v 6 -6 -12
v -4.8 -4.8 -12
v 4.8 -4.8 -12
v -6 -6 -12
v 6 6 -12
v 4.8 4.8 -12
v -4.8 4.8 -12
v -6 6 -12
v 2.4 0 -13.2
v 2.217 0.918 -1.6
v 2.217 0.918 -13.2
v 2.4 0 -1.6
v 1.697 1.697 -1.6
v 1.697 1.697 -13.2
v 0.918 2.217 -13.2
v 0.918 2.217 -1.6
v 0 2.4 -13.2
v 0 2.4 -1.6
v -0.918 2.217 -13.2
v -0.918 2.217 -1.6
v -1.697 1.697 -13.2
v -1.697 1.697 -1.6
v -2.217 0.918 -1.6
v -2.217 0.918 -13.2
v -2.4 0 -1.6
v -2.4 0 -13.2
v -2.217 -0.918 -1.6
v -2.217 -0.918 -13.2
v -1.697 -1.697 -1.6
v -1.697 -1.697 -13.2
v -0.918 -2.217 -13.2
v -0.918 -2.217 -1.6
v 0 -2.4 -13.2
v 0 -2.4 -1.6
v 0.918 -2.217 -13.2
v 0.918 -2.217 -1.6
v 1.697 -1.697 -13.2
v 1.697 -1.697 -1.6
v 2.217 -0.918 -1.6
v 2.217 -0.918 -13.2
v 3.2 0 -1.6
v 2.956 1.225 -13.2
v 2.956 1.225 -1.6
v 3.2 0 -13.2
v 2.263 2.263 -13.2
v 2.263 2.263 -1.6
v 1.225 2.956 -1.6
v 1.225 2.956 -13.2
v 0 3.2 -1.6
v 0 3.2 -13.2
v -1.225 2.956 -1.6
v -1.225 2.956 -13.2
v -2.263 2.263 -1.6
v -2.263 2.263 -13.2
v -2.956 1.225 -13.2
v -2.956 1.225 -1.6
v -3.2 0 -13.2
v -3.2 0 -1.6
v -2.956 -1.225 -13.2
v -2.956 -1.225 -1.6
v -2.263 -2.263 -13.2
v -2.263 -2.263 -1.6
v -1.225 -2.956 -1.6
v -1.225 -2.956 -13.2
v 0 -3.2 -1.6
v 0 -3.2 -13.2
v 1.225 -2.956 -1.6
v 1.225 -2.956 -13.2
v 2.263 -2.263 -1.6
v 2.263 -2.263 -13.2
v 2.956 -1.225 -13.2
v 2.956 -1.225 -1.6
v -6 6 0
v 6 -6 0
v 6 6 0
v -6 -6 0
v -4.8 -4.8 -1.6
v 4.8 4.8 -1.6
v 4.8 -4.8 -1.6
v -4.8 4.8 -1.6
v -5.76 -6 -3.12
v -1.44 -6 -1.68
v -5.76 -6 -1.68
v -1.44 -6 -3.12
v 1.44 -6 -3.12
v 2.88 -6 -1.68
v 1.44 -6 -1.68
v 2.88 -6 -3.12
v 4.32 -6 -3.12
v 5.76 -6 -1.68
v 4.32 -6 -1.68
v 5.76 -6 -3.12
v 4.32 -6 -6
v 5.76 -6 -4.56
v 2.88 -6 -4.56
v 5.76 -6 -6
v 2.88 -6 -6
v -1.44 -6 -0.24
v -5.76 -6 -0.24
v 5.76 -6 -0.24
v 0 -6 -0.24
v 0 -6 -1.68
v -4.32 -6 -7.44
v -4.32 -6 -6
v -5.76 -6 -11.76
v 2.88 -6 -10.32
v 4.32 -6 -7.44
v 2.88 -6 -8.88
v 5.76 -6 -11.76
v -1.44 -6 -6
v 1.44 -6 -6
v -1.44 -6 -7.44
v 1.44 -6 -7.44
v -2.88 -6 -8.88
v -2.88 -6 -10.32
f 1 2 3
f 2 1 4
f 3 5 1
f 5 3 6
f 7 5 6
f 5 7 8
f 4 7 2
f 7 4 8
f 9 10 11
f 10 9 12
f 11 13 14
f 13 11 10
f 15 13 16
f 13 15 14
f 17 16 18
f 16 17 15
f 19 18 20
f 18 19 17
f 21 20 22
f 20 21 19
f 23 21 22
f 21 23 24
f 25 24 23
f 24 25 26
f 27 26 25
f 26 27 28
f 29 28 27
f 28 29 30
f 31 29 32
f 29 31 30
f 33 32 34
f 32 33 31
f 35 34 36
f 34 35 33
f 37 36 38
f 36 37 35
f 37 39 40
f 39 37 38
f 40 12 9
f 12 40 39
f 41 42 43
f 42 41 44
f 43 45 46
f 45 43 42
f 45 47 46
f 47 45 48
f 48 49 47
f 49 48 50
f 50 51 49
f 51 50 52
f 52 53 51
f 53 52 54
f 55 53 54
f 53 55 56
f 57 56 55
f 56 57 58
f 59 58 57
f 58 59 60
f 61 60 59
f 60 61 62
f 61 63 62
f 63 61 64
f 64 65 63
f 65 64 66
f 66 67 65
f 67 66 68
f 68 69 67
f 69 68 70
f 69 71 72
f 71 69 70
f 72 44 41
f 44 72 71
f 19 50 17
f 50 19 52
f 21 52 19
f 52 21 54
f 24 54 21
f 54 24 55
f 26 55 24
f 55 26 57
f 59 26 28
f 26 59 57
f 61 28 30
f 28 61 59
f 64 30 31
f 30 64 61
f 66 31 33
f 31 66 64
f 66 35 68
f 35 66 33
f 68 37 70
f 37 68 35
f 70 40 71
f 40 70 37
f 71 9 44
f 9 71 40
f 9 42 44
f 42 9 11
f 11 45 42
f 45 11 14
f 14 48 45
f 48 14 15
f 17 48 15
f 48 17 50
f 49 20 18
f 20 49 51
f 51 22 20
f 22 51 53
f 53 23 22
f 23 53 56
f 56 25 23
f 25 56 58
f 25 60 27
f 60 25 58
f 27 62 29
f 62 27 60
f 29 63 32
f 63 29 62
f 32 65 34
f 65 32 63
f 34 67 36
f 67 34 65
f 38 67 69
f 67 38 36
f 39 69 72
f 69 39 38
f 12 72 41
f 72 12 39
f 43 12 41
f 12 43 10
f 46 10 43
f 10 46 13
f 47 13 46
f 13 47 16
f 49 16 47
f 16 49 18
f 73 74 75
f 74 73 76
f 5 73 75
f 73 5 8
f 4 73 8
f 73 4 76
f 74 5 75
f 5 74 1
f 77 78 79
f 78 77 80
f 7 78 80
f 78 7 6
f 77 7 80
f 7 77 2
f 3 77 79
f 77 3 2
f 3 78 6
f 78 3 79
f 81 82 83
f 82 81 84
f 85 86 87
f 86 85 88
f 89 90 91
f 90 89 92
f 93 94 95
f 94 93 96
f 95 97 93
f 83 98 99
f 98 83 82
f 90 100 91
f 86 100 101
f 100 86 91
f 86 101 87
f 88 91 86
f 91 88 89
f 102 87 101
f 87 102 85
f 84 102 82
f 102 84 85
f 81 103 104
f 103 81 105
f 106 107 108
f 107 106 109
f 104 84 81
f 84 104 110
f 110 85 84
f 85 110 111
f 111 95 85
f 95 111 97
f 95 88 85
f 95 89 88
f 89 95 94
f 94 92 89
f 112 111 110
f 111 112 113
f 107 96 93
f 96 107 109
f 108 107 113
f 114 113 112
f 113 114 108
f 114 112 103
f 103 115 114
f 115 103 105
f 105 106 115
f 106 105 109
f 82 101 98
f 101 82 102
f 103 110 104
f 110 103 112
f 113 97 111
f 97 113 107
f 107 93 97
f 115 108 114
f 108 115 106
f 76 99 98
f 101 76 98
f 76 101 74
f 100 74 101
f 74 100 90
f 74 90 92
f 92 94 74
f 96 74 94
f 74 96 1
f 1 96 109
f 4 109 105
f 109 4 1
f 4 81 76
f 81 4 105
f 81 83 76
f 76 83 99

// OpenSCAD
// file: ../p/4-4ring3.scad
use <../lib.scad>
$fa=1; $fs=0.2;
function ldraw_lib__4_4ring3(realsolid=false) = [
// 0 Ring  3 x 1.0
// 0 Name: 4-4ring3.dat
// 0 Author: James Jessiman
// 0 !LDRAW_ORG Primitive UPDATE 2009-01
// 0 !LICENSE Licensed under CC BY 2.0 and CC BY 4.0 : see CAreadme.txt
// 
// 0 BFC CERTIFY CCW
  [0,"BFC","CERTIFY"],
  [0,"BFC","CCW"],
// 
// 0 !HISTORY 1998-12-15 [PTadmin] Official Update 1998-10
// 0 !HISTORY 2002-04-05 [hafhead] Added BFC statement
// 0 !HISTORY 2002-04-25 [PTadmin] Official Update 2002-02
// 0 !HISTORY 2007-06-24 [PTadmin] Header formatted for Contributor Agreement
// 0 !HISTORY 2008-07-01 [PTadmin] Official Update 2008-01
// 0 !HISTORY 2008-08-26 [cwdee] Switch polygon winding and rename
// 0 !HISTORY 2009-05-02 [PTadmin] Official Update 2009-01
// 
// 
// 4 16 -1.5308 0 3.6956 -1.1481 0 2.7717 0 0 3 0 0 4
  [4,16,-1.5308,0,3.6956,-1.1481,0,2.7717,0,0,3,0,0,4],
// 4 16 -2.8284 0 2.8284 -2.1213 0 2.1213 -1.1481 0 2.7717 -1.5308 0 3.6956
  [4,16,-2.8284,0,2.8284,-2.1213,0,2.1213,-1.1481,0,2.7717,-1.5308,0,3.6956],
// 4 16 -3.6956 0 1.5308 -2.7717 0 1.1481 -2.1213 0 2.1213 -2.8284 0 2.8284
  [4,16,-3.6956,0,1.5308,-2.7717,0,1.1481,-2.1213,0,2.1213,-2.8284,0,2.8284],
// 4 16 -4 0 0 -3 0 0 -2.7717 0 1.1481 -3.6956 0 1.5308
  [4,16,-4,0,0,-3,0,0,-2.7717,0,1.1481,-3.6956,0,1.5308],
// 4 16 -3.6956 0 -1.5308 -2.7717 0 -1.1481 -3 0 0 -4 0 0
  [4,16,-3.6956,0,-1.5308,-2.7717,0,-1.1481,-3,0,0,-4,0,0],
// 4 16 -2.8284 0 -2.8284 -2.1213 0 -2.1213 -2.7717 0 -1.1481 -3.6956 0 -1.5308
  [4,16,-2.8284,0,-2.8284,-2.1213,0,-2.1213,-2.7717,0,-1.1481,-3.6956,0,-1.5308],
// 4 16 -1.5308 0 -3.6956 -1.1481 0 -2.7717 -2.1213 0 -2.1213 -2.8284 0 -2.8284
  [4,16,-1.5308,0,-3.6956,-1.1481,0,-2.7717,-2.1213,0,-2.1213,-2.8284,0,-2.8284],
// 4 16 0 0 -4 0 0 -3 -1.1481 0 -2.7717 -1.5308 0 -3.6956
  [4,16,0,0,-4,0,0,-3,-1.1481,0,-2.7717,-1.5308,0,-3.6956],
// 4 16 1.5308 0 -3.6956 1.1481 0 -2.7717 0 0 -3 0 0 -4
  [4,16,1.5308,0,-3.6956,1.1481,0,-2.7717,0,0,-3,0,0,-4],
// 4 16 2.8284 0 -2.8284 2.1213 0 -2.1213 1.1481 0 -2.7717 1.5308 0 -3.6956
  [4,16,2.8284,0,-2.8284,2.1213,0,-2.1213,1.1481,0,-2.7717,1.5308,0,-3.6956],
// 4 16 3.6956 0 -1.5308 2.7717 0 -1.1481 2.1213 0 -2.1213 2.8284 0 -2.8284
  [4,16,3.6956,0,-1.5308,2.7717,0,-1.1481,2.1213,0,-2.1213,2.8284,0,-2.8284],
// 4 16 4 0 0 3 0 0 2.7717 0 -1.1481 3.6956 0 -1.5308
  [4,16,4,0,0,3,0,0,2.7717,0,-1.1481,3.6956,0,-1.5308],
// 4 16 3.6956 0 1.5308 2.7717 0 1.1481 3 0 0 4 0 0
  [4,16,3.6956,0,1.5308,2.7717,0,1.1481,3,0,0,4,0,0],
// 4 16 2.8284 0 2.8284 2.1213 0 2.1213 2.7717 0 1.1481 3.6956 0 1.5308
  [4,16,2.8284,0,2.8284,2.1213,0,2.1213,2.7717,0,1.1481,3.6956,0,1.5308],
// 4 16 1.5308 0 3.6956 1.1481 0 2.7717 2.1213 0 2.1213 2.8284 0 2.8284
  [4,16,1.5308,0,3.6956,1.1481,0,2.7717,2.1213,0,2.1213,2.8284,0,2.8284],
// 4 16 0 0 4 0 0 3 1.1481 0 2.7717 1.5308 0 3.6956
  [4,16,0,0,4,0,0,3,1.1481,0,2.7717,1.5308,0,3.6956],
// 0
];
module ldraw_lib__4_4ring3(step=0, col=false, unit=2/5, alt=false, line=0.2, solid=!$preview)
    makepoly(ldraw_lib__4_4ring3(solid), step=step, col=col, unit=unit, alt=alt, line=line, solid=solid);
ldraw_lib__4_4ring3(line=0.2);
// file: ../p/4-4edge.scad
use <../lib.scad>
function ldraw_lib__4_4edge() = [
// 0 Circle 1.0
// 0 Name: 4-4edge.dat
// 0 Author: James Jessiman
// 0 !LDRAW_ORG Primitive UPDATE 2017-01
// 0 !LICENSE Licensed under CC BY 2.0 and CC BY 4.0 : see CAreadme.txt
// 
// 0 BFC CERTIFY CCW
  [0,"BFC","CERTIFY"],
  [0,"BFC","CCW"],
// 
// 0 !HISTORY 1998-12-15 [PTadmin] Official Update 1998-10
// 0 !HISTORY 2005-12-28 [PTadmin] Official Update 2005-01
// 0 !HISTORY 2007-06-24 [PTadmin] Header formatted for Contributor Agreement
// 0 !HISTORY 2008-07-01 [PTadmin] Official Update 2008-01
// 0 !HISTORY 2017-01-15 [Steffen] BFCed
// 0 !HISTORY 2017-12-30 [PTadmin] Official Update 2017-01
// 
// 
// 2 24 1 0 0 0.9239 0 0.3827
  [2,24,1,0,0,0.9239,0,0.3827],
// 2 24 0.9239 0 0.3827 0.7071 0 0.7071
  [2,24,0.9239,0,0.3827,0.7071,0,0.7071],
// 2 24 0.7071 0 0.7071 0.3827 0 0.9239
  [2,24,0.7071,0,0.7071,0.3827,0,0.9239],
// 2 24 0.3827 0 0.9239 0 0 1
  [2,24,0.3827,0,0.9239,0,0,1],
// 2 24 0 0 1 -0.3827 0 0.9239
  [2,24,0,0,1,-0.3827,0,0.9239],
// 2 24 -0.3827 0 0.9239 -0.7071 0 0.7071
  [2,24,-0.3827,0,0.9239,-0.7071,0,0.7071],
// 2 24 -0.7071 0 0.7071 -0.9239 0 0.3827
  [2,24,-0.7071,0,0.7071,-0.9239,0,0.3827],
// 2 24 -0.9239 0 0.3827 -1 0 -0
  [2,24,-0.9239,0,0.3827,-1,0,-0],
// 2 24 -1 0 -0 -0.9239 0 -0.3827
  [2,24,-1,0,-0,-0.9239,0,-0.3827],
// 2 24 -0.9239 0 -0.3827 -0.7071 0 -0.7071
  [2,24,-0.9239,0,-0.3827,-0.7071,0,-0.7071],
// 2 24 -0.7071 0 -0.7071 -0.3827 0 -0.9239
  [2,24,-0.7071,0,-0.7071,-0.3827,0,-0.9239],
// 2 24 -0.3827 0 -0.9239 0 0 -1
  [2,24,-0.3827,0,-0.9239,0,0,-1],
// 2 24 0 0 -1 0.3827 0 -0.9239
  [2,24,0,0,-1,0.3827,0,-0.9239],
// 2 24 0.3827 0 -0.9239 0.7071 0 -0.7071
  [2,24,0.3827,0,-0.9239,0.7071,0,-0.7071],
// 2 24 0.7071 0 -0.7071 0.9239 0 -0.3827
  [2,24,0.7071,0,-0.7071,0.9239,0,-0.3827],
// 2 24 0.9239 0 -0.3827 1 0 0
  [2,24,0.9239,0,-0.3827,1,0,0],
];
module ldraw_lib__4_4edge(step=0, col=false, unit=2/5, alt=false, line=0.2, solid=!$preview)
    makepoly(ldraw_lib__4_4edge(), step=step, col=col, unit=unit, alt=alt, line=line, solid=solid);
ldraw_lib__4_4edge(line=0.2);
// file: ../p/4-4cyli.scad
use <../lib.scad>
$fa=1; $fs=0.2;
function ldraw_lib__4_4cyli(realsolid=false) = [
// 0 Cylinder 1.0
// 0 Name: 4-4cyli.dat
// 0 Author: James Jessiman
// 0 !LDRAW_ORG Primitive UPDATE 2005-01
// 0 !LICENSE Licensed under CC BY 2.0 and CC BY 4.0 : see CAreadme.txt
// 
// 0 BFC CERTIFY CCW
  [0,"BFC","CERTIFY"],
  [0,"BFC","CCW"],
// 
// 0 !HISTORY 1998-12-15 [PTadmin] Official Update 1998-10
// 0 !HISTORY 2002-03-23 [sbliss] Added BFC statement; merged headers from files in distributions LDraw 0.27 and Complete.
// 0 !HISTORY 2002-04-25 [PTadmin] Official Update 2002-02
// 0 !HISTORY 2004-12-14 [guyvivan] BFC CCW
// 0 !HISTORY 2005-12-28 [PTadmin] Official Update 2005-01
// 0 !HISTORY 2007-06-24 [PTadmin] Header formatted for Contributor Agreement
// 0 !HISTORY 2008-07-01 [PTadmin] Official Update 2008-01
// 
// 
// 4 16 1 1 0 0.9239 1 0.3827 0.9239 0 0.3827 1 0 0
  [4,16,1,1,0,0.9239,1,0.3827,0.9239,0,0.3827,1,0,0],
// 5 24 1 0 0 1 1 0 0.9239 0 0.3827 0.9239 0 -0.3827
  [5,24,1,0,0,1,1,0,0.9239,0,0.3827,0.9239,0,-0.3827],
// 4 16 0.9239 1 0.3827 0.7071 1 0.7071 0.7071 0 0.7071 0.9239 0 0.3827
  [4,16,0.9239,1,0.3827,0.7071,1,0.7071,0.7071,0,0.7071,0.9239,0,0.3827],
// 5 24 0.9239 0 0.3827 0.9239 1 0.3827 0.7071 0 0.7071 1 0 0
  [5,24,0.9239,0,0.3827,0.9239,1,0.3827,0.7071,0,0.7071,1,0,0],
// 4 16 0.7071 1 0.7071 0.3827 1 0.9239 0.3827 0 0.9239 0.7071 0 0.7071
  [4,16,0.7071,1,0.7071,0.3827,1,0.9239,0.3827,0,0.9239,0.7071,0,0.7071],
// 5 24 0.7071 0 0.7071 0.7071 1 0.7071 0.3827 0 0.9239 0.9239 0 0.3827
  [5,24,0.7071,0,0.7071,0.7071,1,0.7071,0.3827,0,0.9239,0.9239,0,0.3827],
// 4 16 0.3827 1 0.9239 0 1 1 0 0 1 0.3827 0 0.9239
  [4,16,0.3827,1,0.9239,0,1,1,0,0,1,0.3827,0,0.9239],
// 5 24 0.3827 0 0.9239 0.3827 1 0.9239 0 0 1 0.7071 0 0.7071
  [5,24,0.3827,0,0.9239,0.3827,1,0.9239,0,0,1,0.7071,0,0.7071],
// 4 16 0 1 1 -0.3827 1 0.9239 -0.3827 0 0.9239 0 0 1
  [4,16,0,1,1,-0.3827,1,0.9239,-0.3827,0,0.9239,0,0,1],
// 5 24 0 0 1 0 1 1 -0.3827 0 0.9239 0.3827 0 0.9239
  [5,24,0,0,1,0,1,1,-0.3827,0,0.9239,0.3827,0,0.9239],
// 4 16 -0.3827 1 0.9239 -0.7071 1 0.7071 -0.7071 0 0.7071 -0.3827 0 0.9239
  [4,16,-0.3827,1,0.9239,-0.7071,1,0.7071,-0.7071,0,0.7071,-0.3827,0,0.9239],
// 5 24 -0.3827 0 0.9239 -0.3827 1 0.9239 -0.7071 0 0.7071 0 0 1
  [5,24,-0.3827,0,0.9239,-0.3827,1,0.9239,-0.7071,0,0.7071,0,0,1],
// 4 16 -0.7071 1 0.7071 -0.9239 1 0.3827 -0.9239 0 0.3827 -0.7071 0 0.7071
  [4,16,-0.7071,1,0.7071,-0.9239,1,0.3827,-0.9239,0,0.3827,-0.7071,0,0.7071],
// 5 24 -0.7071 0 0.7071 -0.7071 1 0.7071 -0.9239 0 0.3827 -0.3827 0 0.9239
  [5,24,-0.7071,0,0.7071,-0.7071,1,0.7071,-0.9239,0,0.3827,-0.3827,0,0.9239],
// 4 16 -0.9239 1 0.3827 -1 1 0 -1 0 0 -0.9239 0 0.3827
  [4,16,-0.9239,1,0.3827,-1,1,0,-1,0,0,-0.9239,0,0.3827],
// 5 24 -0.9239 0 0.3827 -0.9239 1 0.3827 -1 0 0 -0.7071 0 0.7071
  [5,24,-0.9239,0,0.3827,-0.9239,1,0.3827,-1,0,0,-0.7071,0,0.7071],
// 4 16 -1 1 0 -0.9239 1 -0.3827 -0.9239 0 -0.3827 -1 0 0
  [4,16,-1,1,0,-0.9239,1,-0.3827,-0.9239,0,-0.3827,-1,0,0],
// 5 24 -1 0 0 -1 1 0 -0.9239 0 -0.3827 -0.9239 0 0.3827
  [5,24,-1,0,0,-1,1,0,-0.9239,0,-0.3827,-0.9239,0,0.3827],
// 4 16 -0.9239 1 -0.3827 -0.7071 1 -0.7071 -0.7071 0 -0.7071 -0.9239 0 -0.3827
  [4,16,-0.9239,1,-0.3827,-0.7071,1,-0.7071,-0.7071,0,-0.7071,-0.9239,0,-0.3827],
// 5 24 -0.9239 0 -0.3827 -0.9239 1 -0.3827 -0.7071 0 -0.7071 -1 0 0
  [5,24,-0.9239,0,-0.3827,-0.9239,1,-0.3827,-0.7071,0,-0.7071,-1,0,0],
// 4 16 -0.7071 1 -0.7071 -0.3827 1 -0.9239 -0.3827 0 -0.9239 -0.7071 0 -0.7071
  [4,16,-0.7071,1,-0.7071,-0.3827,1,-0.9239,-0.3827,0,-0.9239,-0.7071,0,-0.7071],
// 5 24 -0.7071 0 -0.7071 -0.7071 1 -0.7071 -0.3827 0 -0.9239 -0.9239 0 -0.3827
  [5,24,-0.7071,0,-0.7071,-0.7071,1,-0.7071,-0.3827,0,-0.9239,-0.9239,0,-0.3827],
// 4 16 -0.3827 1 -0.9239 0 1 -1 0 0 -1 -0.3827 0 -0.9239
  [4,16,-0.3827,1,-0.9239,0,1,-1,0,0,-1,-0.3827,0,-0.9239],
// 5 24 -0.3827 0 -0.9239 -0.3827 1 -0.9239 0 0 -1 -0.7071 0 -0.7071
  [5,24,-0.3827,0,-0.9239,-0.3827,1,-0.9239,0,0,-1,-0.7071,0,-0.7071],
// 4 16 0 1 -1 0.3827 1 -0.9239 0.3827 0 -0.9239 0 0 -1
  [4,16,0,1,-1,0.3827,1,-0.9239,0.3827,0,-0.9239,0,0,-1],
// 5 24 0 0 -1 0 1 -1 0.3827 0 -0.9239 -0.3827 0 -0.9239
  [5,24,0,0,-1,0,1,-1,0.3827,0,-0.9239,-0.3827,0,-0.9239],
// 4 16 0.3827 1 -0.9239 0.7071 1 -0.7071 0.7071 0 -0.7071 0.3827 0 -0.9239
  [4,16,0.3827,1,-0.9239,0.7071,1,-0.7071,0.7071,0,-0.7071,0.3827,0,-0.9239],
// 5 24 0.3827 0 -0.9239 0.3827 1 -0.9239 0.7071 0 -0.7071 0 0 -1
  [5,24,0.3827,0,-0.9239,0.3827,1,-0.9239,0.7071,0,-0.7071,0,0,-1],
// 4 16 0.7071 1 -0.7071 0.9239 1 -0.3827 0.9239 0 -0.3827 0.7071 0 -0.7071
  [4,16,0.7071,1,-0.7071,0.9239,1,-0.3827,0.9239,0,-0.3827,0.7071,0,-0.7071],
// 5 24 0.7071 0 -0.7071 0.7071 1 -0.7071 0.9239 0 -0.3827 0.3827 0 -0.9239
  [5,24,0.7071,0,-0.7071,0.7071,1,-0.7071,0.9239,0,-0.3827,0.3827,0,-0.9239],
// 4 16 0.9239 1 -0.3827 1 1 0 1 0 0 0.9239 0 -0.3827
  [4,16,0.9239,1,-0.3827,1,1,0,1,0,0,0.9239,0,-0.3827],
// 5 24 0.9239 0 -0.3827 0.9239 1 -0.3827 1 0 0 0.7071 0 -0.7071
  [5,24,0.9239,0,-0.3827,0.9239,1,-0.3827,1,0,0,0.7071,0,-0.7071],
// 0
];
module ldraw_lib__4_4cyli(step=0, col=false, unit=2/5, alt=false, line=0.2, solid=!$preview)
    makepoly(ldraw_lib__4_4cyli(solid), step=step, col=col, unit=unit, alt=alt, line=line, solid=solid);
ldraw_lib__4_4cyli(line=0.2);
// file: ../p/stud4.scad
use <../lib.scad>
use <4-4cyli.scad>
use <4-4edge.scad>
use <4-4ring3.scad>
function ldraw_lib__stud4() = [
// 0 Stud Tube Open
// 0 Name: stud4.dat
// 0 Author: James Jessiman
// 0 !LDRAW_ORG Primitive UPDATE 2009-02
// 0 !LICENSE Licensed under CC BY 4.0 : see CAreadme.txt
// 
// 0 BFC CERTIFY CCW
  [0,"BFC","CERTIFY"],
  [0,"BFC","CCW"],
// 
// 0 !HISTORY 1999-07-05 [PTadmin] Official Update 1999-05
// 0 !HISTORY 2002-04-04 [sbliss] Modified for BFC compliance
// 0 !HISTORY 2002-04-25 [PTadmin] Official Update 2002-02
// 0 !HISTORY 2007-06-24 [PTadmin] Header formatted for Contributor Agreement
// 0 !HISTORY 2008-07-01 [PTadmin] Official Update 2008-01
// 0 !HISTORY 2009-06-21 [cwdee] Update ring references to 4-4ring
// 0 !HISTORY 2009-09-03 [PTadmin] Official Update 2009-02
// 
// 
// 1 16 0 -4 0 6 0 0 0 1 0 0 0 6 4-4edge.dat
  [1,16,0,-4,0,6,0,0,0,1,0,0,0,6, ldraw_lib__4_4edge()],
// 1 16 0 -4 0 8 0 0 0 1 0 0 0 8 4-4edge.dat
  [1,16,0,-4,0,8,0,0,0,1,0,0,0,8, ldraw_lib__4_4edge()],
// 1 16 0 0 0 6 0 0 0 1 0 0 0 6 4-4edge.dat
  [1,16,0,0,0,6,0,0,0,1,0,0,0,6, ldraw_lib__4_4edge()],
// 1 16 0 0 0 8 0 0 0 1 0 0 0 8 4-4edge.dat
  [1,16,0,0,0,8,0,0,0,1,0,0,0,8, ldraw_lib__4_4edge()],
// 0 BFC INVERTNEXT
  [0,"BFC","INVERTNEXT"],
// 1 16 0 -4 0 6 0 0 0 4 0 0 0 6 4-4cyli.dat
  [1,16,0,-4,0,6,0,0,0,4,0,0,0,6, ldraw_lib__4_4cyli()],
// 1 16 0 -4 0 8 0 0 0 4 0 0 0 8 4-4cyli.dat
  [1,16,0,-4,0,8,0,0,0,4,0,0,0,8, ldraw_lib__4_4cyli()],
// 1 16 0 -4 0 2 0 0 0 1 0 0 0 2 4-4ring3.dat
  [1,16,0,-4,0,2,0,0,0,1,0,0,0,2, ldraw_lib__4_4ring3()],
  [-1,16,0,0,0,2,0,0,0,-1,0,0,0,2, ldraw_lib__4_4ring3()],
// 0
];
module ldraw_lib__stud4(step=0, col=false, unit=2/5, alt=false, line=0.2, solid=!$preview)
    makepoly(ldraw_lib__stud4(), step=step, col=col, unit=unit, alt=alt, line=line, solid=solid);
ldraw_lib__stud4(line=0.2);
// file: ../p/box5.scad
use <../lib.scad>
function ldraw_lib__box5() = [
// 0 Box with 5 Faces and All Edges
// 0 Name: box5.dat
// 0 Author: James Jessiman
// 0 !LDRAW_ORG Primitive UPDATE 2012-01
// 0 !LICENSE Licensed under CC BY 2.0 and CC BY 4.0 : see CAreadme.txt
// 
// 0 BFC CERTIFY CCW
  [0,"BFC","CERTIFY"],
  [0,"BFC","CCW"],
// 
// 0 !HISTORY 2002-04-03 [sbliss] Modified for BFC compliance
// 0 !HISTORY 2002-04-25 [PTadmin] Official Update 2002-02
// 0 !HISTORY 2007-06-24 [PTadmin] Header formatted for Contributor Agreement
// 0 !HISTORY 2008-07-01 [PTadmin] Official Update 2008-01
// 0 !HISTORY 2012-02-16 [Philo] Changed to CCW
// 0 !HISTORY 2012-03-30 [PTadmin] Official Update 2012-01
// 
// 
// 2 24 1 1 1 -1 1 1
  [2,24,1,1,1,-1,1,1],
// 2 24 -1 1 1 -1 1 -1
  [2,24,-1,1,1,-1,1,-1],
// 2 24 -1 1 -1 1 1 -1
  [2,24,-1,1,-1,1,1,-1],
// 2 24 1 1 -1 1 1 1
  [2,24,1,1,-1,1,1,1],
// 2 24 1 0 1 -1 0 1
  [2,24,1,0,1,-1,0,1],
// 2 24 -1 0 1 -1 0 -1
  [2,24,-1,0,1,-1,0,-1],
// 2 24 -1 0 -1 1 0 -1
  [2,24,-1,0,-1,1,0,-1],
// 2 24 1 0 -1 1 0 1
  [2,24,1,0,-1,1,0,1],
// 2 24 1 0 1 1 1 1
  [2,24,1,0,1,1,1,1],
// 2 24 -1 0 1 -1 1 1
  [2,24,-1,0,1,-1,1,1],
// 2 24 1 0 -1 1 1 -1
  [2,24,1,0,-1,1,1,-1],
// 2 24 -1 0 -1 -1 1 -1
  [2,24,-1,0,-1,-1,1,-1],
// 4 16 -1 1 1 1 1 1 1 1 -1 -1 1 -1
  [4,16,-1,1,1,1,1,1,1,1,-1,-1,1,-1],
// 4 16 -1 1 1 -1 0 1 1 0 1 1 1 1
  [4,16,-1,1,1,-1,0,1,1,0,1,1,1,1],
// 4 16 -1 1 -1 -1 0 -1 -1 0 1 -1 1 1
  [4,16,-1,1,-1,-1,0,-1,-1,0,1,-1,1,1],
// 4 16 1 1 -1 1 0 -1 -1 0 -1 -1 1 -1
  [4,16,1,1,-1,1,0,-1,-1,0,-1,-1,1,-1],
// 4 16 1 1 1 1 0 1 1 0 -1 1 1 -1
  [4,16,1,1,1,1,0,1,1,0,-1,1,1,-1],
];
makepoly(ldraw_lib__box5(), line=0.2);
// file: ../p/box4t.scad
use <../lib.scad>
function ldraw_lib__box4t() = [
// 0 Box with 4 Adjacent Faces and All Edges
// 0 Name: box4t.dat
// 0 Author: Tore Eriksson [Tore_Eriksson]
// 0 !LDRAW_ORG Primitive UPDATE 2003-02
// 0 !LICENSE Licensed under CC BY 2.0 and CC BY 4.0 : see CAreadme.txt
// 
// 0 BFC CERTIFY CCW
  [0,"BFC","CERTIFY"],
  [0,"BFC","CCW"],
// 
// 0 !HISTORY 1997-09-29 [PTadmin] Official Update 1997-15
// 0 !HISTORY 2002-08-31 [izanette] Modified with WINDZ for BFC compliance
// 0 !HISTORY 2003-08-01 [PTadmin] Official Update 2003-02
// 0 !HISTORY 2007-06-24 [PTadmin] Header formatted for Contributor Agreement
// 0 !HISTORY 2008-07-01 [PTadmin] Official Update 2008-01
// 
// 
// 2 24 1 1 1 -1 1 1
  [2,24,1,1,1,-1,1,1],
// 2 24 -1 1 1 -1 1 -1
  [2,24,-1,1,1,-1,1,-1],
// 2 24 -1 1 -1 1 1 -1
  [2,24,-1,1,-1,1,1,-1],
// 2 24 1 1 -1 1 1 1
  [2,24,1,1,-1,1,1,1],
// 2 24 1 0 1 -1 0 1
  [2,24,1,0,1,-1,0,1],
// 2 24 -1 0 1 -1 0 -1
  [2,24,-1,0,1,-1,0,-1],
// 2 24 -1 0 -1 1 0 -1
  [2,24,-1,0,-1,1,0,-1],
// 2 24 1 0 -1 1 0 1
  [2,24,1,0,-1,1,0,1],
// 2 24 1 0 1 1 1 1
  [2,24,1,0,1,1,1,1],
// 2 24 -1 0 1 -1 1 1
  [2,24,-1,0,1,-1,1,1],
// 2 24 1 0 -1 1 1 -1
  [2,24,1,0,-1,1,1,-1],
// 2 24 -1 0 -1 -1 1 -1
  [2,24,-1,0,-1,-1,1,-1],
// 4 16 1 1 1 1 1 -1 -1 1 -1 -1 1 1
  [4,16,1,1,1,1,1,-1,-1,1,-1,-1,1,1],
// 4 16 1 1 1 -1 1 1 -1 0 1 1 0 1
  [4,16,1,1,1,-1,1,1,-1,0,1,1,0,1],
// 4 16 -1 1 1 -1 1 -1 -1 0 -1 -1 0 1
  [4,16,-1,1,1,-1,1,-1,-1,0,-1,-1,0,1],
// 0 4 16 -1 1 -1 -1 0 -1 1 0 -1 1 1 -1
// 4 16 1 1 -1 1 1 1 1 0 1 1 0 -1
  [4,16,1,1,-1,1,1,1,1,0,1,1,0,-1],
// 0
];
makepoly(ldraw_lib__box4t(), line=0.2);
// file: s/19729s01.scad
use <../../lib.scad>
use <../../p/box4t.scad>
use <../../p/box5.scad>
use <../../p/stud4.scad>
function ldraw_lib__s__19729s01() = [
// 0 ~Minifig Head Cuboid without Front Surface
// 0 Name: s\19729s01.dat
// 0 Author: Mark Kennedy [mkennedy]
// 0 !LDRAW_ORG Subpart UPDATE 2016-01
// 0 !LICENSE Licensed under CC BY 4.0 : see CAreadme.txt
// 
// 0 BFC CERTIFY CW
  [0,"BFC","CERTIFY"],
  [0,"BFC","CW"],
// 
// 0 !HISTORY 2016-03-18 {LEGO Digital Designer} Original part shape
// 0 !HISTORY 2016-03-28 [mkennedy] Primitive substitution
// 0 !HISTORY 2016-12-31 [PTadmin] Official Update 2016-01
// 
// 
// 4 16 15 30 -15 12 30 -12 -12 30 -12 -15 30 -15
  [4,16,15,30,-15,12,30,-12,-12,30,-12,-15,30,-15],
// 4 16 15 30 15 12 30 12 12 30 -12 15 30 -15
  [4,16,15,30,15,12,30,12,12,30,-12,15,30,-15],
// 4 16 -15 30 15 -12 30 12 12 30 12 15 30 15
  [4,16,-15,30,15,-12,30,12,12,30,12,15,30,15],
// 4 16 -15 30 -15 -12 30 -12 -12 30 12 -15 30 15
  [4,16,-15,30,-15,-12,30,-12,-12,30,12,-15,30,15],
// 0
// 1 16 0 4 0 1 0 0 0 -7.25 0 0 0 1 stud4.dat
  [1,16,0,4,0,1,0,0,0,-7.25,0,0,0,1, ldraw_lib__stud4()],
// 1 16 0 30 0 15 0 0 0 -30 0 0 0 15 box4t.dat
  [1,16,0,30,0,15,0,0,0,-30,0,0,0,15, ldraw_lib__box4t()],
// 0 BFC INVERTNEXT
  [0,"BFC","INVERTNEXT"],
// 1 16 0 30 0 12 0 0 0 -26 0 0 0 12 box5.dat
  [1,16,0,30,0,12,0,0,0,-26,0,0,0,12, ldraw_lib__box5()],
// 
];
module ldraw_lib__s__19729s01(step=0, col=false, unit=2/5, alt=false, line=0.2, solid=!$preview)
    makepoly(ldraw_lib__s__19729s01(), step=step, col=col, unit=unit, alt=alt, line=line, solid=solid);
ldraw_lib__s__19729s01(line=0.2);
// main file
use <../lib.scad>
use <s/19729s01.scad>
function ldraw_lib__19729p09() = [
// 0 Minifig Head Cuboid with Minecraft Wither Skull Skeleton Face Pattern
// 0 Name: 19729p09.dat
// 0 Author: Vincent Messenet [Cheenzo]
// 0 !LDRAW_ORG Part UPDATE 2024-08
// 0 !LICENSE Licensed under CC BY 4.0 : see CAreadme.txt
// 
// 0 BFC CERTIFY CCW
  [0,"BFC","CERTIFY"],
  [0,"BFC","CCW"],
// 
// 0 !KEYWORDS Bricklink 19729pb010, Brickowl 580572, Rebrickable 19729pr0013
// 0 !KEYWORDS Set 21126, Set 21139, Set 21154, Set 30331
// 
// 0 !HISTORY 2024-09-30 [OrionP] Official Update 2024-08
// 
// 
// 1 16 0 0 0 1 0 0 0 1 0 0 0 1 s\19729s01.dat
  [1,16,0,0,0,1,0,0,0,1,0,0,0,1, ldraw_lib__s__19729s01()],
// 
// 4 15 -14.4 4.2 -15 -14.4 7.8 -15 -3.6 7.8 -15 -3.6 4.2 -15
  [4,15,-14.4,4.2,-15,-14.4,7.8,-15,-3.6,7.8,-15,-3.6,4.2,-15],
// 4 15 7.2 4.2 -15 3.6 4.2 -15 3.6 7.8 -15 7.2 7.8 -15
  [4,15,7.2,4.2,-15,3.6,4.2,-15,3.6,7.8,-15,7.2,7.8,-15],
// 4 15 14.4 4.2 -15 10.8 4.2 -15 10.8 7.8 -15 14.4 7.8 -15
  [4,15,14.4,4.2,-15,10.8,4.2,-15,10.8,7.8,-15,14.4,7.8,-15],
// 4 15 10.8 15 -15 14.4 15 -15 14.4 11.4 -15 7.2 11.4 -15
  [4,15,10.8,15,-15,14.4,15,-15,14.4,11.4,-15,7.2,11.4,-15],
// 3 15 7.2 11.4 -15 7.2 15 -15 10.8 15 -15
  [3,15,7.2,11.4,-15,7.2,15,-15,10.8,15,-15],
// 4 71 -14.4 4.2 -15 -3.6 4.2 -15 -3.6 .6 -15 -14.4 .6 -15
  [4,71,-14.4,4.2,-15,-3.6,4.2,-15,-3.6,.6,-15,-14.4,.6,-15],
// 3 71 14.4 4.2 -15 14.4 .6 -15 10.8 4.2 -15
  [3,71,14.4,4.2,-15,14.4,.6,-15,10.8,4.2,-15],
// 4 71 10.8 4.2 -15 14.4 .6 -15 0 .6 -15 7.2 4.2 -15
  [4,71,10.8,4.2,-15,14.4,.6,-15,0,.6,-15,7.2,4.2,-15],
// 3 71 7.2 4.2 -15 0 .6 -15 3.6 4.2 -15
  [3,71,7.2,4.2,-15,0,.6,-15,3.6,4.2,-15],
// 4 71 7.2 4.2 -15 7.2 7.8 -15 10.8 7.8 -15 10.8 4.2 -15
  [4,71,7.2,4.2,-15,7.2,7.8,-15,10.8,7.8,-15,10.8,4.2,-15],
// 4 71 0 .6 -15 0 4.2 -15 3.6 7.8 -15 3.6 4.2 -15
  [4,71,0,.6,-15,0,4.2,-15,3.6,7.8,-15,3.6,4.2,-15],
// 4 71 -3.6 4.2 -15 -3.6 7.8 -15 3.6 7.8 -15 0 4.2 -15
  [4,71,-3.6,4.2,-15,-3.6,7.8,-15,3.6,7.8,-15,0,4.2,-15],
// 4 71 -10.8 18.6 -15 -10.8 15 -15 -14.4 7.8 -15 -14.4 29.4 -15
  [4,71,-10.8,18.6,-15,-10.8,15,-15,-14.4,7.8,-15,-14.4,29.4,-15],
// 4 71 7.2 25.8 -15 14.4 29.4 -15 10.8 18.6 -15 7.2 22.2 -15
  [4,71,7.2,25.8,-15,14.4,29.4,-15,10.8,18.6,-15,7.2,22.2,-15],
// 4 71 -14.4 7.8 -15 -10.8 15 -15 -3.6 15 -15 -3.6 7.8 -15
  [4,71,-14.4,7.8,-15,-10.8,15,-15,-3.6,15,-15,-3.6,7.8,-15],
// 4 71 -3.6 7.8 -15 -3.6 15 -15 3.6 15 -15 3.6 7.8 -15
  [4,71,-3.6,7.8,-15,-3.6,15,-15,3.6,15,-15,3.6,7.8,-15],
// 4 71 3.6 7.8 -15 3.6 15 -15 7.2 15 -15 7.2 11.4 -15
  [4,71,3.6,7.8,-15,3.6,15,-15,7.2,15,-15,7.2,11.4,-15],
// 3 71 7.2 11.4 -15 7.2 7.8 -15 3.6 7.8 -15
  [3,71,7.2,11.4,-15,7.2,7.8,-15,3.6,7.8,-15],
// 4 71 10.8 7.8 -15 7.2 7.8 -15 7.2 11.4 -15 14.4 11.4 -15
  [4,71,10.8,7.8,-15,7.2,7.8,-15,7.2,11.4,-15,14.4,11.4,-15],
// 3 71 14.4 11.4 -15 14.4 7.8 -15 10.8 7.8 -15
  [3,71,14.4,11.4,-15,14.4,7.8,-15,10.8,7.8,-15],
// 4 71 -3.6 15 -15 -3.6 18.6 -15 3.6 18.6 -15 3.6 15 -15
  [4,71,-3.6,15,-15,-3.6,18.6,-15,3.6,18.6,-15,3.6,15,-15],
// 4 71 14.4 15 -15 10.8 15 -15 10.8 18.6 -15 14.4 29.4 -15
  [4,71,14.4,15,-15,10.8,15,-15,10.8,18.6,-15,14.4,29.4,-15],
// 3 71 7.2 22.2 -15 10.8 18.6 -15 3.6 18.6 -15
  [3,71,7.2,22.2,-15,10.8,18.6,-15,3.6,18.6,-15],
// 4 71 7.2 22.2 -15 3.6 18.6 -15 -3.6 18.6 -15 -7.2 22.2 -15
  [4,71,7.2,22.2,-15,3.6,18.6,-15,-3.6,18.6,-15,-7.2,22.2,-15],
// 3 71 -7.2 22.2 -15 -3.6 18.6 -15 -10.8 18.6 -15
  [3,71,-7.2,22.2,-15,-3.6,18.6,-15,-10.8,18.6,-15],
// 4 71 -14.4 29.4 -15 -7.2 25.8 -15 -7.2 22.2 -15 -10.8 18.6 -15
  [4,71,-14.4,29.4,-15,-7.2,25.8,-15,-7.2,22.2,-15,-10.8,18.6,-15],
// 4 71 -14.4 29.4 -15 14.4 29.4 -15 7.2 25.8 -15 -7.2 25.8 -15
  [4,71,-14.4,29.4,-15,14.4,29.4,-15,7.2,25.8,-15,-7.2,25.8,-15],
// 4 16 -3.6 .6 -15 -3.6 4.2 -15 0 4.2 -15 0 .6 -15
  [4,16,-3.6,.6,-15,-3.6,4.2,-15,0,4.2,-15,0,.6,-15],
// 4 16 -10.8 15 -15 -10.8 18.6 -15 -3.6 18.6 -15 -3.6 15 -15
  [4,16,-10.8,15,-15,-10.8,18.6,-15,-3.6,18.6,-15,-3.6,15,-15],
// 4 16 3.6 15 -15 3.6 18.6 -15 10.8 18.6 -15 7.2 15 -15
  [4,16,3.6,15,-15,3.6,18.6,-15,10.8,18.6,-15,7.2,15,-15],
// 3 16 10.8 18.6 -15 10.8 15 -15 7.2 15 -15
  [3,16,10.8,18.6,-15,10.8,15,-15,7.2,15,-15],
// 4 16 -7.2 22.2 -15 -7.2 25.8 -15 7.2 25.8 -15 7.2 22.2 -15
  [4,16,-7.2,22.2,-15,-7.2,25.8,-15,7.2,25.8,-15,7.2,22.2,-15],
// 3 16 -15 0 -15 -14.4 .6 -15 -3.6 .6 -15
  [3,16,-15,0,-15,-14.4,.6,-15,-3.6,.6,-15],
// 4 16 -15 0 -15 -3.6 .6 -15 0 .6 -15 15 0 -15
  [4,16,-15,0,-15,-3.6,.6,-15,0,.6,-15,15,0,-15],
// 3 16 14.4 .6 -15 15 0 -15 0 .6 -15
  [3,16,14.4,.6,-15,15,0,-15,0,.6,-15],
// 3 16 15 0 -15 14.4 .6 -15 14.4 4.2 -15
  [3,16,15,0,-15,14.4,.6,-15,14.4,4.2,-15],
// 3 16 15 0 -15 14.4 4.2 -15 14.4 7.8 -15
  [3,16,15,0,-15,14.4,4.2,-15,14.4,7.8,-15],
// 3 16 14.4 7.8 -15 14.4 11.4 -15 15 0 -15
  [3,16,14.4,7.8,-15,14.4,11.4,-15,15,0,-15],
// 4 16 15 0 -15 14.4 11.4 -15 14.4 15 -15 15 30 -15
  [4,16,15,0,-15,14.4,11.4,-15,14.4,15,-15,15,30,-15],
// 3 16 15 30 -15 14.4 15 -15 14.4 29.4 -15
  [3,16,15,30,-15,14.4,15,-15,14.4,29.4,-15],
// 4 16 15 30 -15 14.4 29.4 -15 -14.4 29.4 -15 -15 30 -15
  [4,16,15,30,-15,14.4,29.4,-15,-14.4,29.4,-15,-15,30,-15],
// 4 16 -15 30 -15 -14.4 29.4 -15 -14.4 7.8 -15 -15 0 -15
  [4,16,-15,30,-15,-14.4,29.4,-15,-14.4,7.8,-15,-15,0,-15],
// 3 16 -14.4 7.8 -15 -14.4 4.2 -15 -15 0 -15
  [3,16,-14.4,7.8,-15,-14.4,4.2,-15,-15,0,-15],
// 3 16 -15 0 -15 -14.4 4.2 -15 -14.4 .6 -15
  [3,16,-15,0,-15,-14.4,4.2,-15,-14.4,.6,-15],
];
module ldraw_lib__19729p09(step=0, col=false, unit=2/5, alt=false, line=0.2, solid=!$preview)
    makepoly(ldraw_lib__19729p09(), step=step, col=col, unit=unit, alt=alt, line=line, solid=solid);
ldraw_lib__19729p09(line=0.2);
